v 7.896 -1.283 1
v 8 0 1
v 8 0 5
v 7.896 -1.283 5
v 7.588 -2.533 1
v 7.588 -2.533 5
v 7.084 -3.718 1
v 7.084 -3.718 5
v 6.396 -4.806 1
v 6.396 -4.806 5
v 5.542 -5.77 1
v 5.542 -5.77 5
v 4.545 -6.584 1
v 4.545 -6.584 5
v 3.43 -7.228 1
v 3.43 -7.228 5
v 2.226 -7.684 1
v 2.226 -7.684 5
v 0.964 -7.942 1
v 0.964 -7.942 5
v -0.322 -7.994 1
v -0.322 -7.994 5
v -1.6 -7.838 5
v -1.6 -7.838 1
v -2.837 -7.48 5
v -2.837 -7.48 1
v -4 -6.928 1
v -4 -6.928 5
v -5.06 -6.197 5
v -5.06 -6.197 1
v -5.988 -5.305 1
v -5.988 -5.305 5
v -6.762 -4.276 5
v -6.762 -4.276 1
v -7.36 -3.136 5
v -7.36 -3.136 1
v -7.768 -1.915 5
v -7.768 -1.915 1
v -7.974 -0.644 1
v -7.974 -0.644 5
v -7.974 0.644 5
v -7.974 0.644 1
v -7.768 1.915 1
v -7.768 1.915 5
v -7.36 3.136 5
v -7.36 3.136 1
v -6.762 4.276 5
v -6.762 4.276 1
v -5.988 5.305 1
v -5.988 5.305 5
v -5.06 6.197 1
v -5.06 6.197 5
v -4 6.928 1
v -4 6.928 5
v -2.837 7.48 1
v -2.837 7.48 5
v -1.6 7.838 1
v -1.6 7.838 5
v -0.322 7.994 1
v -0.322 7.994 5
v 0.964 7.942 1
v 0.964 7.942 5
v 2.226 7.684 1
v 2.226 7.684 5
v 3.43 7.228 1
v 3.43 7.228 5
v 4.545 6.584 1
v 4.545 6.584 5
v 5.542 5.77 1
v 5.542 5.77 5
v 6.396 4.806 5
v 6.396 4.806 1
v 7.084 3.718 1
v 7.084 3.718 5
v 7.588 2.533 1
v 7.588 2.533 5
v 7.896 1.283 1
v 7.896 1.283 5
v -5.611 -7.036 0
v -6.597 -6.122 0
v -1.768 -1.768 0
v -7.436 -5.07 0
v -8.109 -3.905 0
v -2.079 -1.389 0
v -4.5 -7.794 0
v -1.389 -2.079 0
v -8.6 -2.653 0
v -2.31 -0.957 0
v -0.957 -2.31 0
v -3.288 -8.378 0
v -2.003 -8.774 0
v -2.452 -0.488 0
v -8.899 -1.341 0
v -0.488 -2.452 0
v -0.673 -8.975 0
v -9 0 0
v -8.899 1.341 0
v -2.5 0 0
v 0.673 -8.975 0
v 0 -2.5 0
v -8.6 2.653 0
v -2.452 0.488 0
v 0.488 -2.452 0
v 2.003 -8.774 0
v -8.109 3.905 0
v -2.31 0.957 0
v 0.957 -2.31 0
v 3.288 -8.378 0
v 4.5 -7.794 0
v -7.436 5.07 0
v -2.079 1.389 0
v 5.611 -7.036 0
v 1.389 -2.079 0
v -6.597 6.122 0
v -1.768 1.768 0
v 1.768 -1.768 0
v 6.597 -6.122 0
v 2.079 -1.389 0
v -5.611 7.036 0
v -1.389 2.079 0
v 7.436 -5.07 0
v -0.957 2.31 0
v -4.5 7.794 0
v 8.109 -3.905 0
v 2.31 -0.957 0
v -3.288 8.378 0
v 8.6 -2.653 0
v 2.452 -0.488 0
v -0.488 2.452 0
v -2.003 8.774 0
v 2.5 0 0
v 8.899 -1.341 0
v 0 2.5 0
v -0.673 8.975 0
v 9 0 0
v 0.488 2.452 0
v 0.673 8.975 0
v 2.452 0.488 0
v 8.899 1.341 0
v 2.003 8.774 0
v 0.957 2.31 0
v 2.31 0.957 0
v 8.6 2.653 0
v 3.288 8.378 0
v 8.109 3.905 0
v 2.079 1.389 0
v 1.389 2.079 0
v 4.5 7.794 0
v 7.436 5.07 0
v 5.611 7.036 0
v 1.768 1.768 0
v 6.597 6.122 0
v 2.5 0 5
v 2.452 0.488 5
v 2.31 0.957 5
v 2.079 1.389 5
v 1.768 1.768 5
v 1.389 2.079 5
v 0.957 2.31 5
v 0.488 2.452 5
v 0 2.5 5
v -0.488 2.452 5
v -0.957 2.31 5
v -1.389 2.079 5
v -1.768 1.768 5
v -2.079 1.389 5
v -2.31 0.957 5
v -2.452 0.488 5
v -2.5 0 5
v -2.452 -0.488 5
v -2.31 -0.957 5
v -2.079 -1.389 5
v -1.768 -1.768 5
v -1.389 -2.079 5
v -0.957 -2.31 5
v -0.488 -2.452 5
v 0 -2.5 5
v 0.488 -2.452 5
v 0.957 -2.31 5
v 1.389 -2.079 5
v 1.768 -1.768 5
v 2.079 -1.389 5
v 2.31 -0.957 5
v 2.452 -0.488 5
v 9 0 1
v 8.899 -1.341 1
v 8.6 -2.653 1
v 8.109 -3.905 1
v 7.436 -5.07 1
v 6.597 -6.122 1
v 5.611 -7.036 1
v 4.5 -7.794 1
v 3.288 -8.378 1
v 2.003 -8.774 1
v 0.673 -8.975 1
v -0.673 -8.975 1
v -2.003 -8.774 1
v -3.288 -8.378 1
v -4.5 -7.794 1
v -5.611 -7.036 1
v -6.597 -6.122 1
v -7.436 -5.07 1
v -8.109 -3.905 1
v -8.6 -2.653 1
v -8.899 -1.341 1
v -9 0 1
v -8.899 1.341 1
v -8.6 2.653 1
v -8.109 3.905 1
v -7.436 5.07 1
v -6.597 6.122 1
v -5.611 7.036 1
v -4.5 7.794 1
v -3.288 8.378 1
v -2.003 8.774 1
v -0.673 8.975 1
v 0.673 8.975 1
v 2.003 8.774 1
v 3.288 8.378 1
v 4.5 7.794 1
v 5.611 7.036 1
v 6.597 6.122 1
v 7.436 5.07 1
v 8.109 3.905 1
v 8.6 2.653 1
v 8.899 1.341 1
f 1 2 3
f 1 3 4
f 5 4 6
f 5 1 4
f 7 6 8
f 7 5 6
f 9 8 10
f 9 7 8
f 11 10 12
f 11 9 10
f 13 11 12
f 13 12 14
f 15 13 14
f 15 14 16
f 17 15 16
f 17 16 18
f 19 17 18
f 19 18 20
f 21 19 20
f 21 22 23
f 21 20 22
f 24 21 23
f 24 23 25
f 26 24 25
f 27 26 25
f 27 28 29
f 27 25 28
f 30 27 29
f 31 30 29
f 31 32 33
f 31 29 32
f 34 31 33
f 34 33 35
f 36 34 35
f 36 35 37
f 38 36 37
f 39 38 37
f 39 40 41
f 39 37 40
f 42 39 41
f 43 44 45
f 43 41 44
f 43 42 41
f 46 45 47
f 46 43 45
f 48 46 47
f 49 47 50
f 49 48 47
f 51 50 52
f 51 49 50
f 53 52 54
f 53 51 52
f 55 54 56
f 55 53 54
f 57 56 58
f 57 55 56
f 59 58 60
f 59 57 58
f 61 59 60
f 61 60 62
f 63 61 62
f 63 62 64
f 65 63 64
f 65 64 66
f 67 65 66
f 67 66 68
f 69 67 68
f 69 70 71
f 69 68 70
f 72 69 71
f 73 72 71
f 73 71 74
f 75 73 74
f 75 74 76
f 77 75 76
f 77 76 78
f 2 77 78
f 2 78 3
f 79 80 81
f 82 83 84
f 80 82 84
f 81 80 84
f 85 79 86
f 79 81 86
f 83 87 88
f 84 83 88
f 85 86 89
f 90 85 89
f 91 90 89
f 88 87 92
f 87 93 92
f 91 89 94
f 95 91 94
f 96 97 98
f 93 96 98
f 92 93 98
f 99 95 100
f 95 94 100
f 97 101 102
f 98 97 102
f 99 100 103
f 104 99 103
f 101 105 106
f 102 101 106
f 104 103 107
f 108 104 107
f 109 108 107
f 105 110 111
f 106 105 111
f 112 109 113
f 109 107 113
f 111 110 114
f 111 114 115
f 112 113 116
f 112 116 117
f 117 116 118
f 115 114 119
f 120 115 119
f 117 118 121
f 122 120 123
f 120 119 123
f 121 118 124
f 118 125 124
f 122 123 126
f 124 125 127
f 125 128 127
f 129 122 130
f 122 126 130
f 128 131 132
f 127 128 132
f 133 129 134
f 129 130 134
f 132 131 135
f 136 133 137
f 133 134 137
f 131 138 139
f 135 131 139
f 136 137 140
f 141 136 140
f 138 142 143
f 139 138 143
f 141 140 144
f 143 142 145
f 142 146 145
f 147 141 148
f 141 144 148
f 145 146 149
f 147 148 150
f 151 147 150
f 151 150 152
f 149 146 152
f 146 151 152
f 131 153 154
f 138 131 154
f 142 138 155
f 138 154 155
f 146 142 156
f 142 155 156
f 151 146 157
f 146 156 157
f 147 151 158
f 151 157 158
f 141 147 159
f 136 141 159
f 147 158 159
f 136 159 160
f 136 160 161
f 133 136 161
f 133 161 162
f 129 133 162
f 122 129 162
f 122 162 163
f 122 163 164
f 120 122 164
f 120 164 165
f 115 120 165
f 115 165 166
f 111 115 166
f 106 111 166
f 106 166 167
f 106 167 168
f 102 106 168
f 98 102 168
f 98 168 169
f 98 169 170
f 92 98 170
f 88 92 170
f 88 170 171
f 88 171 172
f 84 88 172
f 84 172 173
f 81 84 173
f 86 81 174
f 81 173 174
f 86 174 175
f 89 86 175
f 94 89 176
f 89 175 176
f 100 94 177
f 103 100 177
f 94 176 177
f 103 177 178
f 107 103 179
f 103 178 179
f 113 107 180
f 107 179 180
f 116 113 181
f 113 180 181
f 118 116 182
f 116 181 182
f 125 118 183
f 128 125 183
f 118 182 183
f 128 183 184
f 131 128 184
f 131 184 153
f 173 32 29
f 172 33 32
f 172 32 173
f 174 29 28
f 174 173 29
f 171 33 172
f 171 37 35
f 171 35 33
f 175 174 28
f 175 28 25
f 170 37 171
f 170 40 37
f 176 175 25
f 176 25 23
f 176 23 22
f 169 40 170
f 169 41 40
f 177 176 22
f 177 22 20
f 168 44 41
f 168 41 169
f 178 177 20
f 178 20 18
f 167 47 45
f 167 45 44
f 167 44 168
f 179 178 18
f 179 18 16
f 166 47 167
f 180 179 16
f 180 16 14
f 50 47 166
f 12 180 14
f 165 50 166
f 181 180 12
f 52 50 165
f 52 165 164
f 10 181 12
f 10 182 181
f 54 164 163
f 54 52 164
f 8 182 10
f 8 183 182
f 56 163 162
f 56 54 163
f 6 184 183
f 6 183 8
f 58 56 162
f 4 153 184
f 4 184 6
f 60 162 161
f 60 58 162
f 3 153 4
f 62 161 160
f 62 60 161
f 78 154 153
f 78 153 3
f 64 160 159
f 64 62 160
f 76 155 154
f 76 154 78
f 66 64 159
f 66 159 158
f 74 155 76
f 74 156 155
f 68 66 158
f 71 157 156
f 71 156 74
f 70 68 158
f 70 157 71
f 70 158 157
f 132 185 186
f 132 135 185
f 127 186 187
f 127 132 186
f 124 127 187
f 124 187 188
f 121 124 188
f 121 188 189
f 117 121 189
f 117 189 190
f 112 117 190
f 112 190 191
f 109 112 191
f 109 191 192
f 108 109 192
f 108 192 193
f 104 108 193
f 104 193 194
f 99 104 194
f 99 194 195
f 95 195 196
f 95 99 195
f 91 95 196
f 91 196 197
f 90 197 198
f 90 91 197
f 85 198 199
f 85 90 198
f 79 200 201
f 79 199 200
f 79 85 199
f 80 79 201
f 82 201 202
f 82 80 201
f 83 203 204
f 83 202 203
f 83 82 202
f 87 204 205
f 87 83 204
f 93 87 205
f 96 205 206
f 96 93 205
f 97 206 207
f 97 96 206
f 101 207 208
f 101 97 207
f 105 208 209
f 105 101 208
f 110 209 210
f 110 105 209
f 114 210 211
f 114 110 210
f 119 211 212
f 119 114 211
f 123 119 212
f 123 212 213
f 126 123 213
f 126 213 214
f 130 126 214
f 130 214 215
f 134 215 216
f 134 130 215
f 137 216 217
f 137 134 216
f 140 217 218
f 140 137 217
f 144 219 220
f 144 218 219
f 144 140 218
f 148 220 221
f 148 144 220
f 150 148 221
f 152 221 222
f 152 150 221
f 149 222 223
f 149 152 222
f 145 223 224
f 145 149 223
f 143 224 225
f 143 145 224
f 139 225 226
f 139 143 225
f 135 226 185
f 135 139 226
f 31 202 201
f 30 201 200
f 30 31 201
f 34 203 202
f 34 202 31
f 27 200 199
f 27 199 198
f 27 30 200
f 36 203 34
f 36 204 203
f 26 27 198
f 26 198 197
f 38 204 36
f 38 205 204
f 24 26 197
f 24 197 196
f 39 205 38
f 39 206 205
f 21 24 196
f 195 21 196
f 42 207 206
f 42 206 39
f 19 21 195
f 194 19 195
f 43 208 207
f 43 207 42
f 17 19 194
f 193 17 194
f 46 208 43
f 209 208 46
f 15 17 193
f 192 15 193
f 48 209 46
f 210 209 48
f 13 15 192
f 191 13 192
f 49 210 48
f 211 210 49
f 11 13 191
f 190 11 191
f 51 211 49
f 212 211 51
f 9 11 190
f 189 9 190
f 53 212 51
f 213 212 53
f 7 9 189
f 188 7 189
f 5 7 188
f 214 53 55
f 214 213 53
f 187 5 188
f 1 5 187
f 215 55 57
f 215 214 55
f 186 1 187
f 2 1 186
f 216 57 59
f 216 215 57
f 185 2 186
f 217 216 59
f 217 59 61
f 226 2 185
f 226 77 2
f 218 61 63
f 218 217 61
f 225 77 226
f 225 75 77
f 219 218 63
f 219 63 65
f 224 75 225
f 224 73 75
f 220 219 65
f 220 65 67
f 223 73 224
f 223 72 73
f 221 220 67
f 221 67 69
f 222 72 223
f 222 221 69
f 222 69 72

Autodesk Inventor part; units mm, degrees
ref_plane "YZ Plane" through (0, 0, 0) normal (1, 0, 0) x (0, 1, 0)
ref_plane "XZ Plane" through (0, 0, 0) normal (0, 1, 0) x (-1, 0, 0)
ref_plane "XY Plane" through (0, 0, 0) normal (0, 0, 1) x (1, 0, 0)
sketch "Sketch1" plane through (0, 0, 0) normal (0, 0, 1) x (1, 0, 0)
  circle A0 centre (0, 0) radius 9
  dimension "d0" = 18
extrude "Extrusion1" add sketch "Sketch1" along normal blind 1
sketch "Sketch2" plane through (0, 0, 1) normal (0, 0, 1) x (1, 0, 0)
  circle A0 centre (0, 0) radius 9 projected
  circle A1 centre (0, 0) radius 8
  dimension "d4" = 16
extrude "Extrusion2" add sketch "Sketch2" along normal blind 4 contours A1
sketch "Sketch3" plane through (0, 0, 5) normal (0, 0, 1) x (1, 0, 0)
  circle A0 centre (0, 0) radius 8 projected
  circle A1 centre (0, 0) radius 2.5
  dimension "d8" = 5
extrude "Extrusion3" cut sketch "Sketch3" against normal through all contours A1
properties part number "f625"
